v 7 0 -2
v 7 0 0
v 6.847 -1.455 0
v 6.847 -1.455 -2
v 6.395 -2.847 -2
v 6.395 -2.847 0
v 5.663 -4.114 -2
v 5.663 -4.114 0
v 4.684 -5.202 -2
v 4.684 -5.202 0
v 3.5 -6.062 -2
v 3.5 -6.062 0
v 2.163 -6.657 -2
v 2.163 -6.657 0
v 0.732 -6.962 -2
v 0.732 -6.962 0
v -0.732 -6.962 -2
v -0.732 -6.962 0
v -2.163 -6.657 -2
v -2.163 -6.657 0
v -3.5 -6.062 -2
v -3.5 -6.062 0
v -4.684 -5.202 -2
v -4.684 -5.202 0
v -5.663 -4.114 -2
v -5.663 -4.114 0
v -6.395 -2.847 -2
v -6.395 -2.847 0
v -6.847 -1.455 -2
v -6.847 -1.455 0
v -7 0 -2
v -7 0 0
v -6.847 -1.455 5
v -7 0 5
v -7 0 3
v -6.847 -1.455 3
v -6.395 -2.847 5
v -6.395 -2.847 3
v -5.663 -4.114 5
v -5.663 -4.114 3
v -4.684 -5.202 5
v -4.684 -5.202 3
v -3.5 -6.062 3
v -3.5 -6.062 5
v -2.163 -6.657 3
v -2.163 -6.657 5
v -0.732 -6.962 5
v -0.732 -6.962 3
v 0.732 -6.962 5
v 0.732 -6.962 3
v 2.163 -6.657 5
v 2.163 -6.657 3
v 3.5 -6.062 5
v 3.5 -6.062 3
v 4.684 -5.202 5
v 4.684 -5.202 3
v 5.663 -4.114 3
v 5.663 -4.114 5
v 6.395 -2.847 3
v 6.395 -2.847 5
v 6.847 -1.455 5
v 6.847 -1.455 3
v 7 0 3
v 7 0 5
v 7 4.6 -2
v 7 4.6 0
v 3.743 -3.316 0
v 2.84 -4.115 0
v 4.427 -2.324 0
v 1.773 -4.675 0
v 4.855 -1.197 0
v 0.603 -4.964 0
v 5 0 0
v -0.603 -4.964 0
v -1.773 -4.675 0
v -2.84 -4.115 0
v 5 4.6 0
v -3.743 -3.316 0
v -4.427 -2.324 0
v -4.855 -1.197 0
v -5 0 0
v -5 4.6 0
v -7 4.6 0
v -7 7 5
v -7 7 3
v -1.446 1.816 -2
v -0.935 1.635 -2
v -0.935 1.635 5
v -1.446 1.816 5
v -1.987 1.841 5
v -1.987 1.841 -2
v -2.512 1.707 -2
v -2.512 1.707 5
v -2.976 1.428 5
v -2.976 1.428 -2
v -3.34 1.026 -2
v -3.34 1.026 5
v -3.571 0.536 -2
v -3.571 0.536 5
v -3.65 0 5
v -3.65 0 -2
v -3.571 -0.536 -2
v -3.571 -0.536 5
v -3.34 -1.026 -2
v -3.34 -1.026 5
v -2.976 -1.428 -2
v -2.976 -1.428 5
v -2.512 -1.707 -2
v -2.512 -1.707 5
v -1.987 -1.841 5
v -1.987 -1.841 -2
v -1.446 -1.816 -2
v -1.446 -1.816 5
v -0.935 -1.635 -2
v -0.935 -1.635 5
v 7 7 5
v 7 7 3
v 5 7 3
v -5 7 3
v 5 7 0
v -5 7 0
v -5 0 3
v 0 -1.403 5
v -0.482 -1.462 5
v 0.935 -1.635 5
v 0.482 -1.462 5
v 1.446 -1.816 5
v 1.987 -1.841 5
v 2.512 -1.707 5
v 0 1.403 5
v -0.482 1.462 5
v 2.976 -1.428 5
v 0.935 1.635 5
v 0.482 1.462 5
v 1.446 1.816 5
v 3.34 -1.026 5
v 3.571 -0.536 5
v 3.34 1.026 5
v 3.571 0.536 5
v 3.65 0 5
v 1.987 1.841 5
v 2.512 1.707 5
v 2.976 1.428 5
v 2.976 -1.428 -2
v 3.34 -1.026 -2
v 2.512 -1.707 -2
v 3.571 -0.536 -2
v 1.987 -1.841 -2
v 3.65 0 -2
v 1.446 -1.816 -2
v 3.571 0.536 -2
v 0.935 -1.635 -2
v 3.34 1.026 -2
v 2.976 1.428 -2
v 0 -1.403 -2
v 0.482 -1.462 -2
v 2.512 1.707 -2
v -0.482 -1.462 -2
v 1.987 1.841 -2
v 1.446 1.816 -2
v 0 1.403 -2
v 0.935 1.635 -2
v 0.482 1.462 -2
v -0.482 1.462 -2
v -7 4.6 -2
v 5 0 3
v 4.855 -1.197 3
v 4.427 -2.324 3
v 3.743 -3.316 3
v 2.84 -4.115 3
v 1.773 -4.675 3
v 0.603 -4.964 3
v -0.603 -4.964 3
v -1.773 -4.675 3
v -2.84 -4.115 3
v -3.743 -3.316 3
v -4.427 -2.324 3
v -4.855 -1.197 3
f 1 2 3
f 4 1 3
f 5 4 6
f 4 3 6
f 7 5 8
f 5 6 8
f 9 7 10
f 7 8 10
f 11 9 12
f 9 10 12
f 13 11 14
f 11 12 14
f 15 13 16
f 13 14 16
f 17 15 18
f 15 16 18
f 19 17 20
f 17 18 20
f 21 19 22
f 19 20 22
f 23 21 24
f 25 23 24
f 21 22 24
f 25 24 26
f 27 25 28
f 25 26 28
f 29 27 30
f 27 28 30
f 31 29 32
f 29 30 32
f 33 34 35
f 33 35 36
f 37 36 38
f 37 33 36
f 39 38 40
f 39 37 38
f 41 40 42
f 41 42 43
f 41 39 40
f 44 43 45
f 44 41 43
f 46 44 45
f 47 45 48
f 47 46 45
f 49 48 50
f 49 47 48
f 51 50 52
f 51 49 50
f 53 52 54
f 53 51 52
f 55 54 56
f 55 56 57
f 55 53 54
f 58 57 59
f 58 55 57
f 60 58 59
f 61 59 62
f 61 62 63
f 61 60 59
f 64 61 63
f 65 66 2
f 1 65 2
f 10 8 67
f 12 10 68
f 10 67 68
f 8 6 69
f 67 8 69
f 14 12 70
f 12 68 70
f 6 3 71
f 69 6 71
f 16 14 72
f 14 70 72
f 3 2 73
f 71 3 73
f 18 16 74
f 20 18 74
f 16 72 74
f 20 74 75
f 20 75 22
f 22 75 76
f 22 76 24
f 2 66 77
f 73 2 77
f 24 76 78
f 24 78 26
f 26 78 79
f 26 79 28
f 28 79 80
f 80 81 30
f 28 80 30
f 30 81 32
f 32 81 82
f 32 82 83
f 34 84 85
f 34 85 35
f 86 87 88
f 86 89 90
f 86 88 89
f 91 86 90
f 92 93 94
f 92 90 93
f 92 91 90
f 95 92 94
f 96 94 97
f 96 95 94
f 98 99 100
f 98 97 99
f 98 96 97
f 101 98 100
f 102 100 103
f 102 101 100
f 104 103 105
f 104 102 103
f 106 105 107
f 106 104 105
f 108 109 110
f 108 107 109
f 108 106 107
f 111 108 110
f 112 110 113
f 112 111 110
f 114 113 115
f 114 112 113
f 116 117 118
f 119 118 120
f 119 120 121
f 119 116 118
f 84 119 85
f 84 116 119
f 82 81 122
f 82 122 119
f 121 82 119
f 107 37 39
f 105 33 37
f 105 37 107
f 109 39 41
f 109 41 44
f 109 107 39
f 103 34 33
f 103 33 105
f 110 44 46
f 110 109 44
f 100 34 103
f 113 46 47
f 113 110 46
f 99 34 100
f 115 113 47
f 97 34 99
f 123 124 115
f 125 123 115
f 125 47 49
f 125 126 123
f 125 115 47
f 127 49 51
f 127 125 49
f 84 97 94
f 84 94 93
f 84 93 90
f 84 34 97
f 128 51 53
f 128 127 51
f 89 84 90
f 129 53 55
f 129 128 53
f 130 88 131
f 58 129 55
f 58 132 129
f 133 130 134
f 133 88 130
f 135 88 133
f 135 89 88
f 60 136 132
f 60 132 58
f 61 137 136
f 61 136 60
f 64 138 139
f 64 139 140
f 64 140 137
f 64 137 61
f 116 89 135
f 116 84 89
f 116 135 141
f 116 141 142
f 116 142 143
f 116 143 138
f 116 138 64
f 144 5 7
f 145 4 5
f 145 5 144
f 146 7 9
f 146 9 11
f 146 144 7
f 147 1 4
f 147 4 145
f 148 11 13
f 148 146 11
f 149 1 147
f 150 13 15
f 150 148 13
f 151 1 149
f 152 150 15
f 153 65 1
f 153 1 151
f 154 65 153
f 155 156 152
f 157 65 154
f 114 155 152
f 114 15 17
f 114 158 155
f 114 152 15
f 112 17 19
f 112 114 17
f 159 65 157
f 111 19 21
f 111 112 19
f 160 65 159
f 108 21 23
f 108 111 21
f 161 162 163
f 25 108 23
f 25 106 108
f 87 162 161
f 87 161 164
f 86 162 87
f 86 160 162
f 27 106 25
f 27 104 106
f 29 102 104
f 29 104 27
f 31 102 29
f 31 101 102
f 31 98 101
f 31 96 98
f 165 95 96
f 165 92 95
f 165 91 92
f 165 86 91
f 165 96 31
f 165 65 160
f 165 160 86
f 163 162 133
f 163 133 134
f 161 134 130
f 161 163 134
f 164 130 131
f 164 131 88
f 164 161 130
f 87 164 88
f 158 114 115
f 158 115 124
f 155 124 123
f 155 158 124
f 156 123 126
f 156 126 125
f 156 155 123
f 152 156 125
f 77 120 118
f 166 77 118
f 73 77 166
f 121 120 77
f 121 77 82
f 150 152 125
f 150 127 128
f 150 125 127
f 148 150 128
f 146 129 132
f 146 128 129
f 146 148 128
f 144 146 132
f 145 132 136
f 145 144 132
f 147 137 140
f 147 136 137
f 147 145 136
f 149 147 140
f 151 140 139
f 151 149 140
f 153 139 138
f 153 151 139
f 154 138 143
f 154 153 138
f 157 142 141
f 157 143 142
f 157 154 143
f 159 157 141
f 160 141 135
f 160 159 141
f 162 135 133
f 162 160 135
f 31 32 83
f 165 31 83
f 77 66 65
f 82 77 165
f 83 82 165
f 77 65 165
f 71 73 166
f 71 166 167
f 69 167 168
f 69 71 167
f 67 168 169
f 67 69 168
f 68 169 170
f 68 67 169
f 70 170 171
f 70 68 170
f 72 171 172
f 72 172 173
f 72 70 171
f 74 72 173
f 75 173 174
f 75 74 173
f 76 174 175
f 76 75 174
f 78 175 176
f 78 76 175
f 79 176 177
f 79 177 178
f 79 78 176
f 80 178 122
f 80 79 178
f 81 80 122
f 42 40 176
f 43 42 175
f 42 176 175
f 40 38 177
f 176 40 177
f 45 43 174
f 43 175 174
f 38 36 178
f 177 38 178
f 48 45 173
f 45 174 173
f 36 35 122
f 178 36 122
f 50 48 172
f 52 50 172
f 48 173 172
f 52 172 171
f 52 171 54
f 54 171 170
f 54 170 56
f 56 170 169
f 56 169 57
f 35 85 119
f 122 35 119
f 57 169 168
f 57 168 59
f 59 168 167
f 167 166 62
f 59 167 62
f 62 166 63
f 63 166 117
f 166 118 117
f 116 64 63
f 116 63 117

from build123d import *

# Parameters (mm, degrees)
BOSS_EXTRU_1_DEPTH           = 3
BOSS_EXTRU_2_DEPTH           = 2
BOSS_EXTRU_3_START           = 2
BOSS_EXTRU_3_DEPTH           = 2
ENL_V_MAT_EXTRU_1_DEPTH      = 12.090536506
ENL_V_MAT_EXTRU_1_DEPTH_BACK = 12.090536506
ESQUISSE5_W                  = 14
ESQUISSE5_H                  = 2.4
ENL_V_MAT_EXTRU_2_DEPTH      = 2


with BuildPart() as part:
    # Esquisse1 → Boss.-Extru.1 (new body)
    with BuildSketch(Plane.XY):
        with BuildLine():
            Line((-5, 0), (-5, 7))
            Line((-5, 7), (5, 7))
            Line((5, 7), (5, 0))
            ThreePointArc((5, 0), (0, -5), (-5, 0))
        make_face()
    extrude(amount=BOSS_EXTRU_1_DEPTH)

    # Esquisse2 → Boss.-Extru.2 (add)
    with BuildSketch(Plane.XY):
        with BuildLine():
            Line((-7, 7), (7, 7))
            Line((7, 7), (7, 0))
            ThreePointArc((7, 0), (0, -7), (-7, 0))
            Line((-7, 0), (-7, 7))
        make_face()
    extrude(amount=-BOSS_EXTRU_2_DEPTH)

    # Esquisse3 → Boss.-Extru.3 (add)
    with BuildSketch(Plane.XY.offset(3).offset(BOSS_EXTRU_3_START)):
        with BuildLine():
            Line((7, 7), (-7, 7))
            Line((-7, 7), (-7, 0))
            ThreePointArc((-7, 0), (0, -7), (7, 0))
            Line((7, 0), (7, 7))
        make_face()
    extrude(amount=-BOSS_EXTRU_3_DEPTH)

    # Esquisse4 → Enlèv. mat.-Extru.1 (cut, two sides: drawn at the far end of the back side and taken through both)
    with BuildSketch(Plane.XY.offset(-ENL_V_MAT_EXTRU_1_DEPTH_BACK)):
        with BuildLine():
            ThreePointArc((0.935064935, -1.635355415), (3.65, 0), (0.935064935, 1.635355415))
            ThreePointArc((0.935064935, 1.635355415), (0, 1.403307215), (-0.935064935, 1.635355415))
            ThreePointArc((-0.935064935, 1.635355415), (-3.65, 0), (-0.935064935, -1.635355415))
            ThreePointArc((-0.935064935, -1.635355415), (0, -1.403307215), (0.935064935, -1.635355415))
        make_face()
    extrude(amount=ENL_V_MAT_EXTRU_1_DEPTH + ENL_V_MAT_EXTRU_1_DEPTH_BACK, mode=Mode.SUBTRACT)

    # Esquisse5 → Enlèv. mat.-Extru.2 (cut)
    with BuildSketch(Plane(origin=(0, 0, -2), x_dir=(-1, 0, 0), z_dir=(0, 0, -1))):
        with Locations((0, 5.8)):
            Rectangle(ESQUISSE5_W, ESQUISSE5_H)
    extrude(amount=-ENL_V_MAT_EXTRU_2_DEPTH, mode=Mode.SUBTRACT)


solid = part.part
